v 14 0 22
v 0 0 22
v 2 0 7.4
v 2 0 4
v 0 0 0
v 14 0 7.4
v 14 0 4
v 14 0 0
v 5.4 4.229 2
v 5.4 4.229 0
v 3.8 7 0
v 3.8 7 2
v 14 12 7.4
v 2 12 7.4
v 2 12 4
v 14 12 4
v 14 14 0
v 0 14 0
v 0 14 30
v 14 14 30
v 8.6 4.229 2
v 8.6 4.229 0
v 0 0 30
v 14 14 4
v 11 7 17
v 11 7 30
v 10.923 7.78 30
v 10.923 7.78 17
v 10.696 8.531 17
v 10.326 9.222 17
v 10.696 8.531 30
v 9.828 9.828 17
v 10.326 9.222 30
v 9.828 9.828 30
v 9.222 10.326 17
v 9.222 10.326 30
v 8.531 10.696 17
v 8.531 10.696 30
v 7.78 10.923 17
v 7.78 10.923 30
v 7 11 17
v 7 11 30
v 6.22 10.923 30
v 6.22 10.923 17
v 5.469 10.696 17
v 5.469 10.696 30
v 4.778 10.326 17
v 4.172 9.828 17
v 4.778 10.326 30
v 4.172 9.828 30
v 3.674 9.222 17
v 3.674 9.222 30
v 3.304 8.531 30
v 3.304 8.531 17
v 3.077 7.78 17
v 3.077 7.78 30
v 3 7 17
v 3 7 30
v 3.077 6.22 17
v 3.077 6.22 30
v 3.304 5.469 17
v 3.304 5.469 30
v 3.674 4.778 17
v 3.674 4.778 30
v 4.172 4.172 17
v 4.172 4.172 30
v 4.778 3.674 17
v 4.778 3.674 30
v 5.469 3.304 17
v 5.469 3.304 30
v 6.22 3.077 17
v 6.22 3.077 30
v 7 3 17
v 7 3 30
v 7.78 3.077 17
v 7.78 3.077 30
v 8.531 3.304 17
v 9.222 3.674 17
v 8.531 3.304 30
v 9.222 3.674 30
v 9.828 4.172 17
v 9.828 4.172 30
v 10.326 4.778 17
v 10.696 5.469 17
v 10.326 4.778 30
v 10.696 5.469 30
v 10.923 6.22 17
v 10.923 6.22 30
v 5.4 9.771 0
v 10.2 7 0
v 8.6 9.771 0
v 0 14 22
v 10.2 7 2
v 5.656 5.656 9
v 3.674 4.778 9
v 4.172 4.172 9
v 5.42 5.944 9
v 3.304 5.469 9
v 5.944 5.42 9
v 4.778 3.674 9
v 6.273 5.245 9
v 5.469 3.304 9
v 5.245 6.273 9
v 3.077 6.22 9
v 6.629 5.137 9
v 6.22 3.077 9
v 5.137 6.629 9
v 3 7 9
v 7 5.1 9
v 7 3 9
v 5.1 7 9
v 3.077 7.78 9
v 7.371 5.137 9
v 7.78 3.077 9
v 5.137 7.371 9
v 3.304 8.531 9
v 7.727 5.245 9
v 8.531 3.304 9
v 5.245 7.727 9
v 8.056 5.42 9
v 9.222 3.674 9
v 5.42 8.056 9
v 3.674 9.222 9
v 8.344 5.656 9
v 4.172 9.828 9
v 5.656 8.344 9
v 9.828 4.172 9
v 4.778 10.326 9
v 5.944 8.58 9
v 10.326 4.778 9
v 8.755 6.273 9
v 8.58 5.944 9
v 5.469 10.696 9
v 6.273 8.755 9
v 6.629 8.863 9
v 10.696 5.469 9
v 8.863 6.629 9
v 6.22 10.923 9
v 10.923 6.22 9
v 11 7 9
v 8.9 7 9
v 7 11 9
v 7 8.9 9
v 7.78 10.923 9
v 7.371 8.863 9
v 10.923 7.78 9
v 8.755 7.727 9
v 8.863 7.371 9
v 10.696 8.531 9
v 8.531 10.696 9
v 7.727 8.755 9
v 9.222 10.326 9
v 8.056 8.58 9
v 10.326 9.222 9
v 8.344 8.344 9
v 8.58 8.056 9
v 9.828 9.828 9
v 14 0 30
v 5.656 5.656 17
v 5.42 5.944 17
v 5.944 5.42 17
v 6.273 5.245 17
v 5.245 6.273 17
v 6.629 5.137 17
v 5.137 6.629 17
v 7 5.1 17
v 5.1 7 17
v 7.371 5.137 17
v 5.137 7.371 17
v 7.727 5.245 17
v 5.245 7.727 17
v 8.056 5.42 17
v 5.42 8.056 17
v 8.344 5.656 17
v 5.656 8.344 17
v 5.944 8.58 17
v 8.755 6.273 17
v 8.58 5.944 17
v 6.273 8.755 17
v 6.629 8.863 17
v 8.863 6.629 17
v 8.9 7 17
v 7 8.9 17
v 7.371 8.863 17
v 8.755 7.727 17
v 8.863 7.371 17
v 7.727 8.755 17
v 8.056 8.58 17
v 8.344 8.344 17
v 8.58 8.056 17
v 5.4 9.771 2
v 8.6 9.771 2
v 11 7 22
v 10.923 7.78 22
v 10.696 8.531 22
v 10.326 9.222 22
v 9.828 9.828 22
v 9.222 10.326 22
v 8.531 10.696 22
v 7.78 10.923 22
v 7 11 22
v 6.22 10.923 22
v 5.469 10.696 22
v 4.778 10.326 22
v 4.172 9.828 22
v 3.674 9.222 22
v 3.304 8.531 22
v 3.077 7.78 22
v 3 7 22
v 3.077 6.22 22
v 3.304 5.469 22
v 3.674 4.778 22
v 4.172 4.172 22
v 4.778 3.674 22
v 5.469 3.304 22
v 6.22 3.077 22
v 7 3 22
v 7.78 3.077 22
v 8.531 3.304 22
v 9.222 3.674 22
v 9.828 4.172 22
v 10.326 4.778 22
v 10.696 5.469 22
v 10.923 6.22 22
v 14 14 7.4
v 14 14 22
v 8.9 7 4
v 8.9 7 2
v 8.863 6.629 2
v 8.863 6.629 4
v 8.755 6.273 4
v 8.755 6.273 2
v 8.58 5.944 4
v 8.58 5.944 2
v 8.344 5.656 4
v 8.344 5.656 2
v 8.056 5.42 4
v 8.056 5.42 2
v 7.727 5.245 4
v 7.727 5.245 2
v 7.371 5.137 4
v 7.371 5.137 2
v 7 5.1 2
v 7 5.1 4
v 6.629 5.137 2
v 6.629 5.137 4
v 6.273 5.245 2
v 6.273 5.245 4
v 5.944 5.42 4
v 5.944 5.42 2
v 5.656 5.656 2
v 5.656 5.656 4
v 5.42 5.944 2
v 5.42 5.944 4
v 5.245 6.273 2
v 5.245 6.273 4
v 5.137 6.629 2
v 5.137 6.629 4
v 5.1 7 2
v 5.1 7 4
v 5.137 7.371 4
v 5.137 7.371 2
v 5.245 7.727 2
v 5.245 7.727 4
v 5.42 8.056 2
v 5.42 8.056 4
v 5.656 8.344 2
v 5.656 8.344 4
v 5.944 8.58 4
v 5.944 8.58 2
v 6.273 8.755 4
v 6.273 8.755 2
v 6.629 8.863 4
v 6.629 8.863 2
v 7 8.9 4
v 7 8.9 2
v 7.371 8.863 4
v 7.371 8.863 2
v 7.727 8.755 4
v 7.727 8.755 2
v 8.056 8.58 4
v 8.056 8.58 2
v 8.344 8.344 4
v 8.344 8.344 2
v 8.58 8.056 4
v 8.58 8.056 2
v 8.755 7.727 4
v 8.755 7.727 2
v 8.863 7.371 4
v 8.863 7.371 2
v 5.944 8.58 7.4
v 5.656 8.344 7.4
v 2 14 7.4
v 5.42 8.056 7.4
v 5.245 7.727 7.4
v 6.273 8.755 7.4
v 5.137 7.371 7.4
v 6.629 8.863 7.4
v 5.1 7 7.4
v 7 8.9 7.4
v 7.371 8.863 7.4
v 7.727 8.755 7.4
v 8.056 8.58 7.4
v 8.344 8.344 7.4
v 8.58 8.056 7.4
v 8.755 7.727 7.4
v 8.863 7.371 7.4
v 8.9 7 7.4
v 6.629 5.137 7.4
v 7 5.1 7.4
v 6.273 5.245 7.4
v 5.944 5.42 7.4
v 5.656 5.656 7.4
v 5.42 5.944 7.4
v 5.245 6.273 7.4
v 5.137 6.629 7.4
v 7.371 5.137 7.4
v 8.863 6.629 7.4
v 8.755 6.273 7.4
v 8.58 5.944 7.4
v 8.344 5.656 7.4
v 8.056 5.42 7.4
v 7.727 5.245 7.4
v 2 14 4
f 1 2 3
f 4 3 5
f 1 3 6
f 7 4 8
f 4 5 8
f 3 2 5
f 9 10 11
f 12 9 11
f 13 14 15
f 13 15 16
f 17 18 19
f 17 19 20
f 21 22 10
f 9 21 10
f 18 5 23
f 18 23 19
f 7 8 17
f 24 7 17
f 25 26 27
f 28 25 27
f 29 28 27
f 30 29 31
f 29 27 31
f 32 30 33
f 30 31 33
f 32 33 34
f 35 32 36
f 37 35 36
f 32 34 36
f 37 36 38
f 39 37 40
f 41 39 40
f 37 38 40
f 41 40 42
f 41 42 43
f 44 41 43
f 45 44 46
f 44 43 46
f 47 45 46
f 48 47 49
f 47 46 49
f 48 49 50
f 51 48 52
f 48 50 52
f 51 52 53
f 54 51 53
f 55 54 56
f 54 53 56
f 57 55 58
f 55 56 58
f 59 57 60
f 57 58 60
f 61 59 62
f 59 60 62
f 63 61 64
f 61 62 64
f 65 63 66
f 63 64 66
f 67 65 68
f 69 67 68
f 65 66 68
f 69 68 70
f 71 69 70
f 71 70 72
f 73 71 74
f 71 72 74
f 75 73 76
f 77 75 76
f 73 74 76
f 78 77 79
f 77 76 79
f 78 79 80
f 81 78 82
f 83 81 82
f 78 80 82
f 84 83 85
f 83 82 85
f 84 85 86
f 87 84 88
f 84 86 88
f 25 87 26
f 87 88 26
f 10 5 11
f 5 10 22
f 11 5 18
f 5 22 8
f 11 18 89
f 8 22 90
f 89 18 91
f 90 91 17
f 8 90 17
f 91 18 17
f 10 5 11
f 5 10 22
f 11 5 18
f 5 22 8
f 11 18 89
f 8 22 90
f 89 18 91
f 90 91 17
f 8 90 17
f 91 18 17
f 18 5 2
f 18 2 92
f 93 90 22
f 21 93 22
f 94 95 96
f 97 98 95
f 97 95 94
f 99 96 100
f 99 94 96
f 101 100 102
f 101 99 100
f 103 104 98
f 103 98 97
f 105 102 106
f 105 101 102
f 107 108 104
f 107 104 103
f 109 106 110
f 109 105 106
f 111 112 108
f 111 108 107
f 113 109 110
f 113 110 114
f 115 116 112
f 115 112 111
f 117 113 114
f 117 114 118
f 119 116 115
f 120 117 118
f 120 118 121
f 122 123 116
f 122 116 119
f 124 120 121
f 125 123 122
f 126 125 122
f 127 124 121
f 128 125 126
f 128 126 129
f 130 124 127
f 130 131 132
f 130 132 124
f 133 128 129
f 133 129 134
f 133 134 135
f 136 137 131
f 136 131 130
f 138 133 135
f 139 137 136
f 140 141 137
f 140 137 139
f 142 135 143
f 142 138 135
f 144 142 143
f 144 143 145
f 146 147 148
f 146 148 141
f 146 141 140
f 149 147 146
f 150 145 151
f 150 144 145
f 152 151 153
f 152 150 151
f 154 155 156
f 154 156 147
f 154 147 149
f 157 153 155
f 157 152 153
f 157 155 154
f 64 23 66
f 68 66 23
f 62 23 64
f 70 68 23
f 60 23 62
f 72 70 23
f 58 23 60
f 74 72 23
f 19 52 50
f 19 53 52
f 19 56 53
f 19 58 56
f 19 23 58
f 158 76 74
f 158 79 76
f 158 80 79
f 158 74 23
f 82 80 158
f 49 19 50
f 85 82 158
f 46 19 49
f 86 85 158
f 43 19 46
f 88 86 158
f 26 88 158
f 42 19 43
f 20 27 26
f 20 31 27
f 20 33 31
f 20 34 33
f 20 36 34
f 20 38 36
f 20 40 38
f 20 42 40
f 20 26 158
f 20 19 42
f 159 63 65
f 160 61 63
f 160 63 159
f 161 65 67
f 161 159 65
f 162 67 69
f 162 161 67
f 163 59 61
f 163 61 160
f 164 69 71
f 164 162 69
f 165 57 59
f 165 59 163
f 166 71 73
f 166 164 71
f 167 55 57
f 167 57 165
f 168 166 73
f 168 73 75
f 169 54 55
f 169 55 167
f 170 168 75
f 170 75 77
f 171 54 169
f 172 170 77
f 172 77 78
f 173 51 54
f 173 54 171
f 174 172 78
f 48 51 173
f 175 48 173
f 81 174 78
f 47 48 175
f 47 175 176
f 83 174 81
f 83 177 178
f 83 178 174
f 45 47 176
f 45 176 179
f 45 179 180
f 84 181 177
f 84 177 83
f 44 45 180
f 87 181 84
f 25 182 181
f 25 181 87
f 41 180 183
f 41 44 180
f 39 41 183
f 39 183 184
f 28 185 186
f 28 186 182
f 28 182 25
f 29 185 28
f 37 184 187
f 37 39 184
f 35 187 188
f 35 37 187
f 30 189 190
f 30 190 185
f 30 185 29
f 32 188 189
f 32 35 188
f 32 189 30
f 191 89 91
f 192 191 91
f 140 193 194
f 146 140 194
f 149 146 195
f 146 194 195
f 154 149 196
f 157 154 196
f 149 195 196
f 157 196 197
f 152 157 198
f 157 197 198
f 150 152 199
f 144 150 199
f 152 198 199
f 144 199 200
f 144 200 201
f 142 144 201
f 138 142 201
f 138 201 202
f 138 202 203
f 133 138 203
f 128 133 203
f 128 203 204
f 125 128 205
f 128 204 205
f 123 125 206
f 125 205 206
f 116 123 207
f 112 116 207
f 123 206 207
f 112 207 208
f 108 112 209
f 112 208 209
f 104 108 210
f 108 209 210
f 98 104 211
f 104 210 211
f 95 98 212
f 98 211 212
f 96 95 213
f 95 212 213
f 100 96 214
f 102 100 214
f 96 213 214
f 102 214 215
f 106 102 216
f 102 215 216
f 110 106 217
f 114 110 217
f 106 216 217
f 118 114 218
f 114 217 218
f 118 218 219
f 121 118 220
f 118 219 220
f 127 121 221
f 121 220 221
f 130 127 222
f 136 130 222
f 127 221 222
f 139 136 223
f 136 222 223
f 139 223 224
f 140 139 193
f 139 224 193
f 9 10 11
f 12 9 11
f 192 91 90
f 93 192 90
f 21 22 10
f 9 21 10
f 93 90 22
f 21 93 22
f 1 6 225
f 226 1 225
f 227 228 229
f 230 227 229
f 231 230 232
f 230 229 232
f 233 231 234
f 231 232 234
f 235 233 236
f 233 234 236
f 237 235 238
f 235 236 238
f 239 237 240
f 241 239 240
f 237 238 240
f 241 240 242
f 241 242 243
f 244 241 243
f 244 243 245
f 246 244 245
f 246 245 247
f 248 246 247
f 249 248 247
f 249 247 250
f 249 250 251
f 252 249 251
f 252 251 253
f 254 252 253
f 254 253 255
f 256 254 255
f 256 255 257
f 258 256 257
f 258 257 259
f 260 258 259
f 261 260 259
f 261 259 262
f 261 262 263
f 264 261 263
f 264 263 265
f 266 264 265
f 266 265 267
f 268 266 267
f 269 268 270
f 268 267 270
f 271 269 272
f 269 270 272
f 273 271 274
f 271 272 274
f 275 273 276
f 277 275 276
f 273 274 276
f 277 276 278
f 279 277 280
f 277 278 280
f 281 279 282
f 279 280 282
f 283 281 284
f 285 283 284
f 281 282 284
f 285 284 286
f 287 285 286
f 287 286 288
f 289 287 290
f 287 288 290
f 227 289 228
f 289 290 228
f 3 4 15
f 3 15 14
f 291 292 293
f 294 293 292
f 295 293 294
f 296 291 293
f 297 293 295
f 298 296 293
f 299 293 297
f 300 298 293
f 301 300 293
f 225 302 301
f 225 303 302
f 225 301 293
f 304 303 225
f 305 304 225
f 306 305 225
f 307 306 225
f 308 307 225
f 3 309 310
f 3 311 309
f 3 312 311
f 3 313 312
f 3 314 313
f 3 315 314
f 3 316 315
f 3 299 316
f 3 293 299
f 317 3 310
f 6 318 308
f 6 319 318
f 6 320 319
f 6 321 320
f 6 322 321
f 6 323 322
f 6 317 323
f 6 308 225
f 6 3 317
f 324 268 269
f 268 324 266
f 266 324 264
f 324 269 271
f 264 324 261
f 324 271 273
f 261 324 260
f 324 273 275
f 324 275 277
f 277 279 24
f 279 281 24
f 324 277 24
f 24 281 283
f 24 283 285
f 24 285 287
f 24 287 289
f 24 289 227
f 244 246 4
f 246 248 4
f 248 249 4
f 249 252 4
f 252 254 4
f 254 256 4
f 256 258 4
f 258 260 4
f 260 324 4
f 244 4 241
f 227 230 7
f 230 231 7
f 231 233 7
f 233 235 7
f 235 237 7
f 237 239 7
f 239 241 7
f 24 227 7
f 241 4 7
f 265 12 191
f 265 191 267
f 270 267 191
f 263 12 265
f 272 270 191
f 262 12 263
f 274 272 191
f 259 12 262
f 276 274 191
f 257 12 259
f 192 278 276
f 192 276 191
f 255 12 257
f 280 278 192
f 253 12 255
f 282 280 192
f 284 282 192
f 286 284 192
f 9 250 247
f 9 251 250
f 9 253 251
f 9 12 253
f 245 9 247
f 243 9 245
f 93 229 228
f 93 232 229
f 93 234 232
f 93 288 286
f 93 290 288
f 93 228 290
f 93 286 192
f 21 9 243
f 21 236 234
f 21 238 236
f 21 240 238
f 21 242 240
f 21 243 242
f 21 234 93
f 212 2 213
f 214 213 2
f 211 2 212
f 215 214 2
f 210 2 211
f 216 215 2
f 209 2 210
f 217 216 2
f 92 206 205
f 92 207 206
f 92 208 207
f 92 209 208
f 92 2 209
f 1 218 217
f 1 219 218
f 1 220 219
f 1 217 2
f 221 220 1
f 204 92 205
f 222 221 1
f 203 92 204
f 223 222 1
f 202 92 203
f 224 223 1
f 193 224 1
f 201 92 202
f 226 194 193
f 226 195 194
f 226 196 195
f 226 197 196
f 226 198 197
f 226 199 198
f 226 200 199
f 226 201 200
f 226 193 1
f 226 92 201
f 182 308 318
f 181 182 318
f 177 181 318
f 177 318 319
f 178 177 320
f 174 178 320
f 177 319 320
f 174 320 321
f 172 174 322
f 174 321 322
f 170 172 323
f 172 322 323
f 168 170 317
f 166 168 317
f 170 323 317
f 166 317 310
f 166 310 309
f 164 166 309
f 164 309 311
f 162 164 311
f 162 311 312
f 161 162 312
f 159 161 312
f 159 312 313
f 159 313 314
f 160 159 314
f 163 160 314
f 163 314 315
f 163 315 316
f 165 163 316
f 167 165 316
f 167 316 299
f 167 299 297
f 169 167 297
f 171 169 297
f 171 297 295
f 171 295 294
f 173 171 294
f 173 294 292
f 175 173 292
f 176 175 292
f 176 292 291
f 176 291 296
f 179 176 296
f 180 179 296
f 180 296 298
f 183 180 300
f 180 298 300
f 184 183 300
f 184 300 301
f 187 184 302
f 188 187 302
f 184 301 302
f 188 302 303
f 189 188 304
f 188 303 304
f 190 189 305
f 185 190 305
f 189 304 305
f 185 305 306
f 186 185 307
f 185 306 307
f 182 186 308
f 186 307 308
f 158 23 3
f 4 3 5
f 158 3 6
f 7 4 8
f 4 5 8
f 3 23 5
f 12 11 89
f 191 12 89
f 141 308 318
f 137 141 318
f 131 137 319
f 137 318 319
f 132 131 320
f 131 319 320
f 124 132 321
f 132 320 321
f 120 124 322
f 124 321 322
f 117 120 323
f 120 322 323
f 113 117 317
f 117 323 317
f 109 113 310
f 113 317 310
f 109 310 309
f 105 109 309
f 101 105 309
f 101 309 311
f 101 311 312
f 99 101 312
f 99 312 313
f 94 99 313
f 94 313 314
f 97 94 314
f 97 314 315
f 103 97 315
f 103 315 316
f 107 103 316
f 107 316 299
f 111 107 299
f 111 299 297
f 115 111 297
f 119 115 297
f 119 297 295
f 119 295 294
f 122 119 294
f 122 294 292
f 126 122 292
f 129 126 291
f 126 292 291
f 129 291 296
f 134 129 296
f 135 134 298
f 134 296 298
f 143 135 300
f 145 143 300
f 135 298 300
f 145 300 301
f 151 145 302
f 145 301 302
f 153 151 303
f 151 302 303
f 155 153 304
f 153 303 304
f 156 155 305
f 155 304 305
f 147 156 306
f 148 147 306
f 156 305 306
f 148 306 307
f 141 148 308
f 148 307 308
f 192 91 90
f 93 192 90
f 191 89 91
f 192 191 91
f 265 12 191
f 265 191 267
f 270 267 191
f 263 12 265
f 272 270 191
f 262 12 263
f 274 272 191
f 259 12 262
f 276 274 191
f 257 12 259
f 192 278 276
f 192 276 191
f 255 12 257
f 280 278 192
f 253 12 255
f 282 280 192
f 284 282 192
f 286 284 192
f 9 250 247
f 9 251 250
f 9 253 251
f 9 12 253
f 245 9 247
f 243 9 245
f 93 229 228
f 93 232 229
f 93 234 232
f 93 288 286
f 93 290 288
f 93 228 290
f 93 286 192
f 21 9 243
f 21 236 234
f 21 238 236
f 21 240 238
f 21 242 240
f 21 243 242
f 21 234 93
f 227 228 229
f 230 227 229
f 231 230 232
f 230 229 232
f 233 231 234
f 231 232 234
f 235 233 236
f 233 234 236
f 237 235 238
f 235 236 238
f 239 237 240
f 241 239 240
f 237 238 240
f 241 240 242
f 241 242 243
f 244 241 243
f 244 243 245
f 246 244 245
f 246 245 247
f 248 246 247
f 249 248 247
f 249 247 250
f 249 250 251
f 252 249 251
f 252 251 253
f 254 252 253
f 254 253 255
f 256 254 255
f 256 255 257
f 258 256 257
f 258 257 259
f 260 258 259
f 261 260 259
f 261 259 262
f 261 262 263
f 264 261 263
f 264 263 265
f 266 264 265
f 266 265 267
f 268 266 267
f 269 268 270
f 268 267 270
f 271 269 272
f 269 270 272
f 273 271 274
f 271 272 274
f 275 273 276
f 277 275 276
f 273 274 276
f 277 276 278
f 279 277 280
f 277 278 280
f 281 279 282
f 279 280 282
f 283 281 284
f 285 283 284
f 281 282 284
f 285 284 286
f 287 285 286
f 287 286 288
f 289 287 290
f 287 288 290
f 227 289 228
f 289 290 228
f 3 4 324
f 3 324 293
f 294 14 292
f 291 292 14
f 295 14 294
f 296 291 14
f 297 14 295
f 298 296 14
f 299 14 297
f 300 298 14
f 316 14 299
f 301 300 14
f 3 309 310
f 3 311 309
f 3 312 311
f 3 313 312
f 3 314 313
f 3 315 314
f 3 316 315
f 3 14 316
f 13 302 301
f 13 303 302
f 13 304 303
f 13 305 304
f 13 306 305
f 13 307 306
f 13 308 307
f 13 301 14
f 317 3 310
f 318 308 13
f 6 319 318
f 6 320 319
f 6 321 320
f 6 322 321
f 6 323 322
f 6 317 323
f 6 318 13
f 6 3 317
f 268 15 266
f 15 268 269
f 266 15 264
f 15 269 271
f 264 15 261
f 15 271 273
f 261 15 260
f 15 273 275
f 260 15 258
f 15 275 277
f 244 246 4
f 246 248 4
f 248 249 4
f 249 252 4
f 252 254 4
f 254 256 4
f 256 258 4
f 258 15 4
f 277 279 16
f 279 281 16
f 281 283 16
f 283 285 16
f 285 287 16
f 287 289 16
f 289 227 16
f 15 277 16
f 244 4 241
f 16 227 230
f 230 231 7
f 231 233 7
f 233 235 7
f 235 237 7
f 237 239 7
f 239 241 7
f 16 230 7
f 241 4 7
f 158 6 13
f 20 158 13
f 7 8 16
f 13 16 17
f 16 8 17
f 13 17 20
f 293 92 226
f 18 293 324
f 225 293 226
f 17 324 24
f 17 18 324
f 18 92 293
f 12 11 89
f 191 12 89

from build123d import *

# Parameters (mm, degrees)
BOX_W           = 14
BOX_H           = 14
BOX_DEPTH       = 30
SKETCH_R        = 1.9
POCKET_DEPTH    = 17.5
SKETCH001_R     = 4
POCKET001_DEPTH = 13
SKETCH002_W     = 12.464965
SKETCH002_H     = 3.4
POCKET002_DEPTH = 12
POCKET003_DEPTH = 2
BOX001_W        = 14
BOX001_H        = 14
BOX001_DEPTH    = 22
SKETCH004_R     = 1.9
POCKET004_DEPTH = 17.5
SKETCH005_R     = 4
POCKET005_DEPTH = 13
SKETCH006_W     = 15.197168
SKETCH006_H     = 3.4
POCKET006_DEPTH = 15
POCKET007_DEPTH = 2


with BuildPart() as pocket003:
    # Box → Box (new body)
    with BuildSketch(Plane.XY):
        with Locations((7, 7)):
            Rectangle(BOX_W, BOX_H)
    extrude(amount=BOX_DEPTH)

    # Sketch → Pocket (cut)
    with BuildSketch(Plane(origin=(0, 0, 0), x_dir=(1, 0, 0), z_dir=(0, 0, -1))):
        with Locations((7, -7)):
            Circle(SKETCH_R)
    extrude(amount=-POCKET_DEPTH, mode=Mode.SUBTRACT)

    # Sketch001 → Pocket001 (cut)
    with BuildSketch(Plane.XY.offset(30)):
        with Locations((7, 7)):
            Circle(SKETCH001_R)
    extrude(amount=-POCKET001_DEPTH, mode=Mode.SUBTRACT)

    # Sketch002 → Pocket002 (cut)
    with BuildSketch(Plane.XZ):
        with Locations((8.232482, 5.7)):
            Rectangle(SKETCH002_W, SKETCH002_H)
    extrude(amount=-POCKET002_DEPTH, mode=Mode.SUBTRACT)

    # Sketch003 → Pocket003 (cut)
    with BuildSketch(Plane(origin=(0, 0, 0), x_dir=(1, 0, 0), z_dir=(0, 0, -1))):
        Polygon((5.4, -4.228719), (3.8, -7), (5.4, -9.771281), (8.6, -9.771281), (10.2, -7), (8.6, -4.228719), align=None)
    extrude(amount=-POCKET003_DEPTH, mode=Mode.SUBTRACT)


with BuildPart() as pocket007:
    # Box001 → Box001 (new body)
    with BuildSketch(Plane.XY):
        with Locations((7, 7)):
            Rectangle(BOX001_W, BOX001_H)
    extrude(amount=BOX001_DEPTH)

    # Sketch004 → Pocket004 (cut)
    with BuildSketch(Plane(origin=(0, 0, 0), x_dir=(1, 0, 0), z_dir=(0, 0, -1))):
        with Locations((7, -7)):
            Circle(SKETCH004_R)
    extrude(amount=-POCKET004_DEPTH, mode=Mode.SUBTRACT)

    # Sketch005 → Pocket005 (cut)
    with BuildSketch(Plane.XY.offset(22)):
        with Locations((7, 7)):
            Circle(SKETCH005_R)
    extrude(amount=-POCKET005_DEPTH, mode=Mode.SUBTRACT)

    # Sketch006 → Pocket006 (cut)
    with BuildSketch(Plane.XZ):
        with Locations((9.598584, 5.7)):
            Rectangle(SKETCH006_W, SKETCH006_H)
    extrude(amount=-POCKET006_DEPTH, mode=Mode.SUBTRACT)

    # Sketch007 → Pocket007 (cut)
    with BuildSketch(Plane(origin=(0, 0, 0), x_dir=(1, 0, 0), z_dir=(0, 0, -1))):
        Polygon((5.4, -4.228719), (3.8, -7), (5.4, -9.771281), (8.6, -9.771281), (10.2, -7), (8.6, -4.228719), align=None)
    extrude(amount=-POCKET007_DEPTH, mode=Mode.SUBTRACT)


solid = Compound([pocket003.part, pocket007.part])
